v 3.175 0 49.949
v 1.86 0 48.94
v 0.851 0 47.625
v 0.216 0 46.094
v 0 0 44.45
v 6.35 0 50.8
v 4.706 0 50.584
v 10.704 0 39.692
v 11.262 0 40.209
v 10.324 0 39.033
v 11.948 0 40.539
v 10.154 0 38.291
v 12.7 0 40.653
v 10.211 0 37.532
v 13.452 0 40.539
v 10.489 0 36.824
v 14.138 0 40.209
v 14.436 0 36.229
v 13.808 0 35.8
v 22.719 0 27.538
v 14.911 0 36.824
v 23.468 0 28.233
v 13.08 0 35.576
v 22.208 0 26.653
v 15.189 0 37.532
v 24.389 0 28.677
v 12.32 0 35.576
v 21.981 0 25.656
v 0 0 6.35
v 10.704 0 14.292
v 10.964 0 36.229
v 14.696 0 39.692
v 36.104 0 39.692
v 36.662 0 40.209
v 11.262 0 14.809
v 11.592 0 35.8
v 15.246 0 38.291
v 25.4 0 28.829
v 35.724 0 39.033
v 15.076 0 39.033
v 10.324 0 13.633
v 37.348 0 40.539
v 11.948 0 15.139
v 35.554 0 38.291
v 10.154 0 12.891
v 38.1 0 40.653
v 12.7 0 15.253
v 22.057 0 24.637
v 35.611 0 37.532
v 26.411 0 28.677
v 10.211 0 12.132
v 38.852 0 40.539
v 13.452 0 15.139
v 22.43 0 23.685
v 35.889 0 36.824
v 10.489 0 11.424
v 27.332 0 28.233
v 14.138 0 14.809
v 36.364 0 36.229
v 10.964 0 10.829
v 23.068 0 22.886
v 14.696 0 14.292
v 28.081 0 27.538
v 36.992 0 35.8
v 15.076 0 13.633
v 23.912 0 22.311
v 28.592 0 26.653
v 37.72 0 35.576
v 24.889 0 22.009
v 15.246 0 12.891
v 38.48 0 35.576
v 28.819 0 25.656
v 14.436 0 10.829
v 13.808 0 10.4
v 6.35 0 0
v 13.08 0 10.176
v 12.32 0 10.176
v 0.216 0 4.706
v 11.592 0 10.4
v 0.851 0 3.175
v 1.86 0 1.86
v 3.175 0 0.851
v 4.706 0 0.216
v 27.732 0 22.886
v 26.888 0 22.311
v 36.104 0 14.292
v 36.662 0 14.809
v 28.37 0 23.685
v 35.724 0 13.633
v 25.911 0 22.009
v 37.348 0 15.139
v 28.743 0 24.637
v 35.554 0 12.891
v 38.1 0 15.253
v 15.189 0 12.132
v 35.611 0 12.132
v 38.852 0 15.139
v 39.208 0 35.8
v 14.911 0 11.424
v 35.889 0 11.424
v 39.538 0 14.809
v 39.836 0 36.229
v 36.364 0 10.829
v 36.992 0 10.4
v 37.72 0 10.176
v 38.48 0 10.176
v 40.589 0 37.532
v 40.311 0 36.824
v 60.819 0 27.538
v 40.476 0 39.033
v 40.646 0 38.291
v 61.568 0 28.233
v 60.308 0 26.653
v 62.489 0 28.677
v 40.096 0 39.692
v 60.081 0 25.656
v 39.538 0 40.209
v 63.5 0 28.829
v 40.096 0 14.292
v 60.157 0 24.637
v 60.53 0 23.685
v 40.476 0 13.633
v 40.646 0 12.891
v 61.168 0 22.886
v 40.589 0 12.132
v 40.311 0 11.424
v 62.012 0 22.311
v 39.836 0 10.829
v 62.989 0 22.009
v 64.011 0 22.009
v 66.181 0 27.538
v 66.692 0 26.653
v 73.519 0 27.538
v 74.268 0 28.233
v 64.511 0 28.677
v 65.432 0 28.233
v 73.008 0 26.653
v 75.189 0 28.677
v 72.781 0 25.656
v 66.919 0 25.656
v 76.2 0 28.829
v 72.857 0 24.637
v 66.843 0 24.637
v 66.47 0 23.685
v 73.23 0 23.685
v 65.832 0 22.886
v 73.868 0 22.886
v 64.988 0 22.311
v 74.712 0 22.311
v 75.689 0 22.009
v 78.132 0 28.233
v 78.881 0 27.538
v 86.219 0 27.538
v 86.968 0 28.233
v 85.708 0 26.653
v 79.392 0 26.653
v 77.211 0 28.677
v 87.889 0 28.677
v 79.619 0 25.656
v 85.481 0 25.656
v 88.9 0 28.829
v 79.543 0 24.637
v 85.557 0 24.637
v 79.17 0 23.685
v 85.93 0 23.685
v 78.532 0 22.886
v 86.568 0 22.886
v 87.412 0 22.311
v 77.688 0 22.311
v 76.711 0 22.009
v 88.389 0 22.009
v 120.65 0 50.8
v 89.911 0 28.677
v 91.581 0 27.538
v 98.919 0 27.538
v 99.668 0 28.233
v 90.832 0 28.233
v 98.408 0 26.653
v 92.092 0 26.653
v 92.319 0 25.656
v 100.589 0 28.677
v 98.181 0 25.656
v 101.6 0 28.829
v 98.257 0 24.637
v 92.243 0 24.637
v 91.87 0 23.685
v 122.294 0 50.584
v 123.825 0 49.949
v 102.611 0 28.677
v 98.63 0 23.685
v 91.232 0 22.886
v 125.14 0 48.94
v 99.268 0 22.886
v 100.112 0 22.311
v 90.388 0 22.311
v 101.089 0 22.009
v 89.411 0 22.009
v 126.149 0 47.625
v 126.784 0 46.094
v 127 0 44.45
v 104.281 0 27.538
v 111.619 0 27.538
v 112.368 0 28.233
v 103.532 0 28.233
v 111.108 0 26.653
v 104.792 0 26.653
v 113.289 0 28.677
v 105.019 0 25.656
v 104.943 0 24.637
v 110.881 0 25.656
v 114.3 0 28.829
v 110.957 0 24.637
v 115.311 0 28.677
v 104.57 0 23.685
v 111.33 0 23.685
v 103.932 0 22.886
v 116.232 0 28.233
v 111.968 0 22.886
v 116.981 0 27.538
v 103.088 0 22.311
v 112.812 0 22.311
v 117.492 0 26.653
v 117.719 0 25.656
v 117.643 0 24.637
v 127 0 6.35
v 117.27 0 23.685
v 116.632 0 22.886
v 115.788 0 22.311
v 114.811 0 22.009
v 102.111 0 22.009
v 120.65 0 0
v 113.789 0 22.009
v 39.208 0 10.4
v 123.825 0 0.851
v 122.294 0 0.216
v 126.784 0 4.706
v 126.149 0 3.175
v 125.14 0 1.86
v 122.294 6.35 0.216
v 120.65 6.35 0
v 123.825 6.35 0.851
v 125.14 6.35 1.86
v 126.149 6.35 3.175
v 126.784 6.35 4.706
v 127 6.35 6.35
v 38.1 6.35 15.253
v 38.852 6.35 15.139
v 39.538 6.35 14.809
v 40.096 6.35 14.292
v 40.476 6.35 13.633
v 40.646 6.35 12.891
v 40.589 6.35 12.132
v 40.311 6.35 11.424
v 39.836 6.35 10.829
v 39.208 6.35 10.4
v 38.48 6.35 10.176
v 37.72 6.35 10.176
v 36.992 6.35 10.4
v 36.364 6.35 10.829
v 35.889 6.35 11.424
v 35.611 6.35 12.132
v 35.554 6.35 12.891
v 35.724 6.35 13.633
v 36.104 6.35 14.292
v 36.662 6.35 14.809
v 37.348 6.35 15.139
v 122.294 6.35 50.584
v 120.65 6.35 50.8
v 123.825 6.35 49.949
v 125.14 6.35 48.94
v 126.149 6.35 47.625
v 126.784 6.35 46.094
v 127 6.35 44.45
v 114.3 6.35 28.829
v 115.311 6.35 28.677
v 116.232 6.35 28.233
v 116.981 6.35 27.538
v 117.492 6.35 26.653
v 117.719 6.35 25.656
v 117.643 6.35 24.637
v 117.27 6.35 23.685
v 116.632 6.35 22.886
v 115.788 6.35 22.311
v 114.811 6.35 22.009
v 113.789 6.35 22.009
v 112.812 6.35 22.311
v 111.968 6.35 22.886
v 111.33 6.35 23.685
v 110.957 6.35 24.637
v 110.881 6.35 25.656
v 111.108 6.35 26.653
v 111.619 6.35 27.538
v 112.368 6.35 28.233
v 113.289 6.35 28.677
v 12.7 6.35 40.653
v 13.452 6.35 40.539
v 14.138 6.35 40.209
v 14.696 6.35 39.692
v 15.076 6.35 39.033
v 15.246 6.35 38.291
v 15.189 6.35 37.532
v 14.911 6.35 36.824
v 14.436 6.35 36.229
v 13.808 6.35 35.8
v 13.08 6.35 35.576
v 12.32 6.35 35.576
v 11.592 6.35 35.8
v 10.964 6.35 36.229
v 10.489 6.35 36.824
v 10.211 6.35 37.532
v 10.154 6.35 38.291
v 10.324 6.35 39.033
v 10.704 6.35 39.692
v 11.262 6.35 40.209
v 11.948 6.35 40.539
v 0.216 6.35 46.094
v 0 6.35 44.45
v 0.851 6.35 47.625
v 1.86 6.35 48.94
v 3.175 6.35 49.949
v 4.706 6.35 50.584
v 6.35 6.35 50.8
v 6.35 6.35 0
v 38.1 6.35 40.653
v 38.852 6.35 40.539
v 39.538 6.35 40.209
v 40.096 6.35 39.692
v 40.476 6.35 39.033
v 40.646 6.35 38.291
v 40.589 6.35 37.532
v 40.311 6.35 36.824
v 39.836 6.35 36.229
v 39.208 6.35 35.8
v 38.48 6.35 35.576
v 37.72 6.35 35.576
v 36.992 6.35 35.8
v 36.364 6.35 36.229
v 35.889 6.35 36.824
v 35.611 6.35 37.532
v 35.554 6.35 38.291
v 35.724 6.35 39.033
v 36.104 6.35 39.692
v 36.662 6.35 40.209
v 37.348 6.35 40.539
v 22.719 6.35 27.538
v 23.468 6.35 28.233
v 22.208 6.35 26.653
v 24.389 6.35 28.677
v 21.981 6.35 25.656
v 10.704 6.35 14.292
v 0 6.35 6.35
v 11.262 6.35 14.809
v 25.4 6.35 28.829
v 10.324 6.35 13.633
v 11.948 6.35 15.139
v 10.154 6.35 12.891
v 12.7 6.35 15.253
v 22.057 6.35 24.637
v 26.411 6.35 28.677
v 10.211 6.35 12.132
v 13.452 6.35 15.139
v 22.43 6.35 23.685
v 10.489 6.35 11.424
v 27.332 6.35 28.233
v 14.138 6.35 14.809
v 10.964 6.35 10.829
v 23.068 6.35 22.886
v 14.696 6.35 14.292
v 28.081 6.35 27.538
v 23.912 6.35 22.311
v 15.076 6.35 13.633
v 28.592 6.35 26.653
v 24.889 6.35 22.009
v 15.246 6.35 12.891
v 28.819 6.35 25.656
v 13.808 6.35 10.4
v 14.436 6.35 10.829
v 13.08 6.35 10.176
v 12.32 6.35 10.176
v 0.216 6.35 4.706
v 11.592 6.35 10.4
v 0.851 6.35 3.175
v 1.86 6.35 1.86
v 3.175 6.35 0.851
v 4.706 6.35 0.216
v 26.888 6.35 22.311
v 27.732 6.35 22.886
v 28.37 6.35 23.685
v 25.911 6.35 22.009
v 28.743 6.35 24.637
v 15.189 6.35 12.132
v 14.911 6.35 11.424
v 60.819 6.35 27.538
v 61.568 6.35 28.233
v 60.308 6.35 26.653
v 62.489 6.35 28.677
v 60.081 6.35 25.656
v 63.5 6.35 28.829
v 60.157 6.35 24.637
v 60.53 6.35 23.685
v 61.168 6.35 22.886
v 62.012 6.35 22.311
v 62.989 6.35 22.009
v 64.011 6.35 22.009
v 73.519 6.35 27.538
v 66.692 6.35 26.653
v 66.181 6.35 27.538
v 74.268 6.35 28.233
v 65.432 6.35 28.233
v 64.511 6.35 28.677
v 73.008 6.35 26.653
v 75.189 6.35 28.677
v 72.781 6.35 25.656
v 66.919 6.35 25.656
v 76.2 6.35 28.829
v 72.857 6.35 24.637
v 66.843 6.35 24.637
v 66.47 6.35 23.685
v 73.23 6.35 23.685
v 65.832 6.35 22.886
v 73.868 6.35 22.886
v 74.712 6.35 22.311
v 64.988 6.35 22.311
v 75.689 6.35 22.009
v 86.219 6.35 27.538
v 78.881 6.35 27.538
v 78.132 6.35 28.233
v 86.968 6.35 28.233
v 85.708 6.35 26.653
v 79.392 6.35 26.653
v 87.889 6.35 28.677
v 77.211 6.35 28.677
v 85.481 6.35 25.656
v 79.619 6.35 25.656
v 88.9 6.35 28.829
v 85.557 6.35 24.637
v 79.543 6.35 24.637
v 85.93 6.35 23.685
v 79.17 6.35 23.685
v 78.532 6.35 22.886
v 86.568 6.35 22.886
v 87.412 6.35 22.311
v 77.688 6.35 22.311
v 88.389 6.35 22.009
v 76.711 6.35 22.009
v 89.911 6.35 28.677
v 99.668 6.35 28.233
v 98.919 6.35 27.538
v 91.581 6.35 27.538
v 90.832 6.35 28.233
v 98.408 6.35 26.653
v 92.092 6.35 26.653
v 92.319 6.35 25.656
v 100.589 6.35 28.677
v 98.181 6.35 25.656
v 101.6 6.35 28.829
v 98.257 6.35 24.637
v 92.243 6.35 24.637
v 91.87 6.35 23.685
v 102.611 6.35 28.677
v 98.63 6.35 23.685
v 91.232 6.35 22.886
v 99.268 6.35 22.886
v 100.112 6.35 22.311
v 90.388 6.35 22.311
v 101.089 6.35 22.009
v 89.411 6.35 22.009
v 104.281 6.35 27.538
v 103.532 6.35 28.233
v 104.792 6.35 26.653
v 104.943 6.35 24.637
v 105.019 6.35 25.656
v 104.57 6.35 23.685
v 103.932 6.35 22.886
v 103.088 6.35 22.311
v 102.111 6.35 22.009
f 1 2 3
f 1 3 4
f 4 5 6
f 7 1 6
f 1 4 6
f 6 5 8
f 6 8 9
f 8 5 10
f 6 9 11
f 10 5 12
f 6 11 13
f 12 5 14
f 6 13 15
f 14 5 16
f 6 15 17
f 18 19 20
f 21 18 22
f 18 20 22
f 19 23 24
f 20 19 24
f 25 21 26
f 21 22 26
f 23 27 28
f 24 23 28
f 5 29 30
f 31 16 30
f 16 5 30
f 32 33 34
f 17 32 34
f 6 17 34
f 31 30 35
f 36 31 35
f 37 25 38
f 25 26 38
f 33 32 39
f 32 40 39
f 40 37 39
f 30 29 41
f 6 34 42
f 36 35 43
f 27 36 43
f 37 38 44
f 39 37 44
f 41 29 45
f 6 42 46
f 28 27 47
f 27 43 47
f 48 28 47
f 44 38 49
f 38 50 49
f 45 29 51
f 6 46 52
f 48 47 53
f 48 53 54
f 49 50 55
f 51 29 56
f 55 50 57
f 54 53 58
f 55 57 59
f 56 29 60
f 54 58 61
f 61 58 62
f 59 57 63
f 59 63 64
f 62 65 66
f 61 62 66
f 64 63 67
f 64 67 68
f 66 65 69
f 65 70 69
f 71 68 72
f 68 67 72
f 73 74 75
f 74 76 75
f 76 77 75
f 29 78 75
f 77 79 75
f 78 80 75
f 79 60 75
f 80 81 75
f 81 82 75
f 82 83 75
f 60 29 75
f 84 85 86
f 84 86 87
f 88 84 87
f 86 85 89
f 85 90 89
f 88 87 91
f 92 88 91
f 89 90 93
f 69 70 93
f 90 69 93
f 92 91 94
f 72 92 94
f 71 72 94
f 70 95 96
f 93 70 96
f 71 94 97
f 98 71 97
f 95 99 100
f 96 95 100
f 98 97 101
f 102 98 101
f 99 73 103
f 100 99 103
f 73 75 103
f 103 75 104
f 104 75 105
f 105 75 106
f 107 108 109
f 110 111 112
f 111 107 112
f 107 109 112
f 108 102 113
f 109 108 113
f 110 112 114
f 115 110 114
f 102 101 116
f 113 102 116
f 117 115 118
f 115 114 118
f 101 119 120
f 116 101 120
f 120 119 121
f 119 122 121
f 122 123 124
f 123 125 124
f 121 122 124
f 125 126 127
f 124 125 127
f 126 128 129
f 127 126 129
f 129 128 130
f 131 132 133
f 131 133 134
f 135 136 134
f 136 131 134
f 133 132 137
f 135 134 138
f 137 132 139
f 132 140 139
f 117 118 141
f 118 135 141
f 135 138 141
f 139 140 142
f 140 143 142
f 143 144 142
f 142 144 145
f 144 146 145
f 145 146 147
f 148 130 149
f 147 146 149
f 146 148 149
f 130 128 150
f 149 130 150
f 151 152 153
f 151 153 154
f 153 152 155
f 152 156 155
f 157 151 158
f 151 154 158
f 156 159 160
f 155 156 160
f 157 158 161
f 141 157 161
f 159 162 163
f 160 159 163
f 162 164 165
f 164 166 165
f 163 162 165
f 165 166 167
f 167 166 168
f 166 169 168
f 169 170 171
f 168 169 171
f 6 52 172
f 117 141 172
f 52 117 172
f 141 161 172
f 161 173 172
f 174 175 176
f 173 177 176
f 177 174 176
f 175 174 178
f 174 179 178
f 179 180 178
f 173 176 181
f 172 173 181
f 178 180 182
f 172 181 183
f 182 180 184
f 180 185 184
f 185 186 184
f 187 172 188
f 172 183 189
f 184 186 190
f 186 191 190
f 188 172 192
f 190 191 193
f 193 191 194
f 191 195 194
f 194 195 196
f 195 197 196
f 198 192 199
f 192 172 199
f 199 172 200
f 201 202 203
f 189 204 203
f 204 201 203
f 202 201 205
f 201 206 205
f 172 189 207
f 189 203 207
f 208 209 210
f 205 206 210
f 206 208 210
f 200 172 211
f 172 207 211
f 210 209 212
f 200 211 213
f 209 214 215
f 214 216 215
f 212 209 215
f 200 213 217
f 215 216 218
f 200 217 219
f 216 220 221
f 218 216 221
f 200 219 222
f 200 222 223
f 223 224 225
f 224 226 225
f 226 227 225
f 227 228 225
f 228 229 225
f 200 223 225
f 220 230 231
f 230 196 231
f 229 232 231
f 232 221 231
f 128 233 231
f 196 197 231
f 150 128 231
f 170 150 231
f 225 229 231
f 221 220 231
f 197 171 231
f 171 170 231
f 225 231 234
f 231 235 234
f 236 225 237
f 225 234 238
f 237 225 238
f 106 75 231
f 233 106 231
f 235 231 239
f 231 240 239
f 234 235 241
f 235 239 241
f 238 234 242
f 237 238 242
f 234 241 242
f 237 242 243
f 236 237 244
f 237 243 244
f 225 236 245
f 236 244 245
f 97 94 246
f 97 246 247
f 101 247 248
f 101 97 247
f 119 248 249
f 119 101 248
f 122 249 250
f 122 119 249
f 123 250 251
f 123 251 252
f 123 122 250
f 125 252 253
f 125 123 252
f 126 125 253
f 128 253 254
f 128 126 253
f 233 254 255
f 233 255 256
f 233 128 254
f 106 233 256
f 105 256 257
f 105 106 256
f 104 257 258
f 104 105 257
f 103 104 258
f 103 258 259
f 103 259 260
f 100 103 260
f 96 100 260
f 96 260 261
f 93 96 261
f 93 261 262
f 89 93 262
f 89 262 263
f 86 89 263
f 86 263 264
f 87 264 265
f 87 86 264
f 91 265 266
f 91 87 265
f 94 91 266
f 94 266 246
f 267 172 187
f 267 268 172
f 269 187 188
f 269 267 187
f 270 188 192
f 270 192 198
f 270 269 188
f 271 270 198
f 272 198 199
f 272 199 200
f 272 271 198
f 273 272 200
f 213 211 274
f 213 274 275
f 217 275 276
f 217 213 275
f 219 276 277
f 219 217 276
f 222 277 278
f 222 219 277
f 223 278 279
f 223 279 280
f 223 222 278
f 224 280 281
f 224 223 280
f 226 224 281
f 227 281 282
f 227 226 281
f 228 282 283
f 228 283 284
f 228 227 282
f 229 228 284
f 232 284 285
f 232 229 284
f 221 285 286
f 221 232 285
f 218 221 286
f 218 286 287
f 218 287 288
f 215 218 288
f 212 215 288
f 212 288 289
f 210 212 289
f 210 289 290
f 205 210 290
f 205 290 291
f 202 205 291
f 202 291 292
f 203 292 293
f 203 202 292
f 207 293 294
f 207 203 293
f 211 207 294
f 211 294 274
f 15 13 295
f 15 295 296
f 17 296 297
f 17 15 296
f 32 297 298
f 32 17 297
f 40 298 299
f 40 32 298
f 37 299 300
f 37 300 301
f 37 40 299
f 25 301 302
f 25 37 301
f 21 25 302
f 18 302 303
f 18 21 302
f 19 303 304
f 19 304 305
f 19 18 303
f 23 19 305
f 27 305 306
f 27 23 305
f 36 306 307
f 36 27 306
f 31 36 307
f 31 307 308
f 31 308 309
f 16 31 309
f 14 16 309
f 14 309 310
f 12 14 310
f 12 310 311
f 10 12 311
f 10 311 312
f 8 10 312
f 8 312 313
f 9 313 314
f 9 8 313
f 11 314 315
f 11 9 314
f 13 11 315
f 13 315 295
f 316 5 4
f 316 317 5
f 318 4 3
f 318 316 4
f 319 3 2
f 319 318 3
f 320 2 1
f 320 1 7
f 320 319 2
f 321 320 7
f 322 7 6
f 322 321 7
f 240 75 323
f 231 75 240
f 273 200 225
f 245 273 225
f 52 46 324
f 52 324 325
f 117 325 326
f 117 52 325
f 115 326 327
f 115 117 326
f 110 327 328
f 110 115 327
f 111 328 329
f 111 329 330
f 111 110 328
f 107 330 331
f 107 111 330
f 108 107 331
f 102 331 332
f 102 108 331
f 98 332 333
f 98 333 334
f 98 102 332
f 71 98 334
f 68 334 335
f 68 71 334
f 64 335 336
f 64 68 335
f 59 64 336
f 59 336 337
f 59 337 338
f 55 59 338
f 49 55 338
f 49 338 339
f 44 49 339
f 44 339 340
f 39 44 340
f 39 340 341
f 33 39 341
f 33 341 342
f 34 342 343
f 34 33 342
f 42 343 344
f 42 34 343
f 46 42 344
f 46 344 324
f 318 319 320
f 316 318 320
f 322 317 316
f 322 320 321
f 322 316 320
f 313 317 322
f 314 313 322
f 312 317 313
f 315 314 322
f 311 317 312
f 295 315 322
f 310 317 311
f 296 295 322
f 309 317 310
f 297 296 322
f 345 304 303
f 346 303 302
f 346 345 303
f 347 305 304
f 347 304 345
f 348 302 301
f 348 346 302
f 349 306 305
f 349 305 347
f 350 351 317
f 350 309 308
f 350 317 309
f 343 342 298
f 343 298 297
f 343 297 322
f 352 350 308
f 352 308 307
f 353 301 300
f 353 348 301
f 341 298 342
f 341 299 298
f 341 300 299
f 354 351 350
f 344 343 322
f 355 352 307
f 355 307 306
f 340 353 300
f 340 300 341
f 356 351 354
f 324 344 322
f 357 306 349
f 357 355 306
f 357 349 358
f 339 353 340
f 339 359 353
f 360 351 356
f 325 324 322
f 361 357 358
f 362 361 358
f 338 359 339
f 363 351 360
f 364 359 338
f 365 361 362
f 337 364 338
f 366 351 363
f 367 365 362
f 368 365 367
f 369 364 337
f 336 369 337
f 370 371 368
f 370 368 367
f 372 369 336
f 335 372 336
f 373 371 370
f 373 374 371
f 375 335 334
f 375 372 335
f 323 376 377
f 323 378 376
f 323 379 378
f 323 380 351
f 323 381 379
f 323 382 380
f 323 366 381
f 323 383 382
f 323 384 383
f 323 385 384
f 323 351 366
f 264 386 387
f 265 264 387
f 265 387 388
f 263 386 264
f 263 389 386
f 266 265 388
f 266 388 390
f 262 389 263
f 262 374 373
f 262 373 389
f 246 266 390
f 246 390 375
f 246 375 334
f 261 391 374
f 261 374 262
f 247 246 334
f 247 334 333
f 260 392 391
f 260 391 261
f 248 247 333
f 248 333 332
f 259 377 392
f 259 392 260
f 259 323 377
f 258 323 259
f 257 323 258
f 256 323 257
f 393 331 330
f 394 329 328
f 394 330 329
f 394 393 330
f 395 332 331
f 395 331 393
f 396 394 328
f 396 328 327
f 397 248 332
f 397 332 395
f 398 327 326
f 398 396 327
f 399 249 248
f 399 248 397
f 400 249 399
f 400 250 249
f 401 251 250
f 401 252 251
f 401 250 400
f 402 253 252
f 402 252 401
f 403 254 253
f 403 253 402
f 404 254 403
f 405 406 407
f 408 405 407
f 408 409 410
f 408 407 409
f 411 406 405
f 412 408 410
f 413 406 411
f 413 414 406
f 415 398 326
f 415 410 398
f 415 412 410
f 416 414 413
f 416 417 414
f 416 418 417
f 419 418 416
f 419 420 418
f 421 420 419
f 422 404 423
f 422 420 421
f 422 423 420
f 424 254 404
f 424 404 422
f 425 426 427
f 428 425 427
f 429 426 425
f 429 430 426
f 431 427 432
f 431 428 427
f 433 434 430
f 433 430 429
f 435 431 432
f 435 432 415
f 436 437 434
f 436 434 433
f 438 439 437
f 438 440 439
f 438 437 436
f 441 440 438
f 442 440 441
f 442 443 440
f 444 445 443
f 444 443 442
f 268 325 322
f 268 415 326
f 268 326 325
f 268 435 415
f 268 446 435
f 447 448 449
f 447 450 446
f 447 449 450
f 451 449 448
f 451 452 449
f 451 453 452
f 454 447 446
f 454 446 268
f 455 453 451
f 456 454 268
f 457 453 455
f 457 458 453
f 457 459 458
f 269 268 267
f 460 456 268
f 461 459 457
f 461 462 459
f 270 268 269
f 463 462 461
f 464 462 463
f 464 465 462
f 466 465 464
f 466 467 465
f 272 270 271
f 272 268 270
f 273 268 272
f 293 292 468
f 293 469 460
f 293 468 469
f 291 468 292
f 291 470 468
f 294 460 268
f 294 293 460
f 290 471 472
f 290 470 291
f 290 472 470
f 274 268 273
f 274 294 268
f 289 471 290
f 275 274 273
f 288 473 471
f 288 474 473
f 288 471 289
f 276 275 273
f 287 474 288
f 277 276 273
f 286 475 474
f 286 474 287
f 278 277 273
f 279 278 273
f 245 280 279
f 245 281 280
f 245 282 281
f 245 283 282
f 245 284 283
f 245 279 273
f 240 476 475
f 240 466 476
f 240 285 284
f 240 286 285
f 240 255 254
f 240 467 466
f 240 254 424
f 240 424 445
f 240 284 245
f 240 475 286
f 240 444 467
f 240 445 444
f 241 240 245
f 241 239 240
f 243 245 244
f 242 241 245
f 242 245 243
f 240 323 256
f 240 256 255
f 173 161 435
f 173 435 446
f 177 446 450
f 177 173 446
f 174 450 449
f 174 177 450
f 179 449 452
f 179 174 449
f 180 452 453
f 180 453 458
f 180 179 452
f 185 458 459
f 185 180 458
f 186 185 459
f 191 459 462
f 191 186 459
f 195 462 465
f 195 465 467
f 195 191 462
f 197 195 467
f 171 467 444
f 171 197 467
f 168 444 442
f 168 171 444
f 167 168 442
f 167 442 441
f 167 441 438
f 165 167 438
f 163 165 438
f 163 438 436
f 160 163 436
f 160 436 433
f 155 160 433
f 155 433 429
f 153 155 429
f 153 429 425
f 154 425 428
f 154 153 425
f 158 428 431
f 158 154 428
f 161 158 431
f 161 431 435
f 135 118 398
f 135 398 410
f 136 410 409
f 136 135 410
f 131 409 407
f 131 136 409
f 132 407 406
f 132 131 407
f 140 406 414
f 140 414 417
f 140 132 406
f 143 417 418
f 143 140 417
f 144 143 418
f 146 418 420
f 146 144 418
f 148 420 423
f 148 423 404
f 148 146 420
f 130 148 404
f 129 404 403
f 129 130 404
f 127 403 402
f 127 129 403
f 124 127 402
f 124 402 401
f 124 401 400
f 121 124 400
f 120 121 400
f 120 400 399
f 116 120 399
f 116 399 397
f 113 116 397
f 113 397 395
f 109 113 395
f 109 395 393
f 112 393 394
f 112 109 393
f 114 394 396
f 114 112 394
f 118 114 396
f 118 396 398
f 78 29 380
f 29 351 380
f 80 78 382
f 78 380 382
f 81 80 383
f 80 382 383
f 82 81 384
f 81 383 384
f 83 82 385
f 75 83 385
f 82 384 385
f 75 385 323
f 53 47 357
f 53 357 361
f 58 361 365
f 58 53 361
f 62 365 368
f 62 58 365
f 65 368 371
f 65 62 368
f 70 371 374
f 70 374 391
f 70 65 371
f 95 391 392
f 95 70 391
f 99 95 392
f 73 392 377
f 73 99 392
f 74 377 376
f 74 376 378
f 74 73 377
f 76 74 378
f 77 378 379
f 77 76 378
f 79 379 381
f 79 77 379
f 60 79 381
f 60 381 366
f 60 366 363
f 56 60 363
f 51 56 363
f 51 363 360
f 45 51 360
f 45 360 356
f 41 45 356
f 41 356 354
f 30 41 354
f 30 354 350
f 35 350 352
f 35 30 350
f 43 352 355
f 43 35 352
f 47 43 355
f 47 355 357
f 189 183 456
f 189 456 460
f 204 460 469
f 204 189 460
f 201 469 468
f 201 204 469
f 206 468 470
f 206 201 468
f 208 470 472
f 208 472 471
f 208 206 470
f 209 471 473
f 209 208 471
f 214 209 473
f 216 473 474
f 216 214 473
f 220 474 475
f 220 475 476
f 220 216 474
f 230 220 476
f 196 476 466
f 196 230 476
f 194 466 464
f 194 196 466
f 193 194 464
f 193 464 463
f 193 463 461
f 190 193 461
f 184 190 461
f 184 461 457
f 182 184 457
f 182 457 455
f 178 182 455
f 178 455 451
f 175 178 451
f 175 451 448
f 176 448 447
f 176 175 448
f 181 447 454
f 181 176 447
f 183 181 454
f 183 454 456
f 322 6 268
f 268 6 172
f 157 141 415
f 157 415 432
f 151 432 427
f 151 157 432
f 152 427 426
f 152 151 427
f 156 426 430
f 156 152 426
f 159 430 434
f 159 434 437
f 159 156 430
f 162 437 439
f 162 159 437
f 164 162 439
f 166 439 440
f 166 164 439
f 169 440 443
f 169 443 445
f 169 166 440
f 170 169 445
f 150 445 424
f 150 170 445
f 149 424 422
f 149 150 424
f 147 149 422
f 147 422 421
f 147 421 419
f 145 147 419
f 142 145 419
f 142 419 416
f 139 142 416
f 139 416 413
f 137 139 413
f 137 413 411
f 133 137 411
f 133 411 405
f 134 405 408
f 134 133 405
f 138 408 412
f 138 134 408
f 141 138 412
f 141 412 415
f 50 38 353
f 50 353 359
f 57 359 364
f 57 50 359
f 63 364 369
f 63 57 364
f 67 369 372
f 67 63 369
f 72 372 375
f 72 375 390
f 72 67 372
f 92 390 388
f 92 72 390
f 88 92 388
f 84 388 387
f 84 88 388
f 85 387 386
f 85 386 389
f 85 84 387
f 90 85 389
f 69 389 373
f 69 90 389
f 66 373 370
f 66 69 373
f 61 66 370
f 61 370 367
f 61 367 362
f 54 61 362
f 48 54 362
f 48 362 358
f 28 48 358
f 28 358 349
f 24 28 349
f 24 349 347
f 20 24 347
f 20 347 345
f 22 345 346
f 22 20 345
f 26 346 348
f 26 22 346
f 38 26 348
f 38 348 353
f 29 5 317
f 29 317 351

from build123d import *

# Parameters (mm, degrees)
SKETCH1_W           = 127
SKETCH1_H           = 50.8
SKETCH1_R           = 2.5527
SKETCH1_R_2         = 3.429
BOSS_EXTRUDE1_DEPTH = 6.35
FILLET1_R           = 6.35


with BuildPart() as part:
    # Sketch1 → Boss-Extrude1 (new body)
    with BuildSketch(Plane(origin=(0, 0, 0), x_dir=(1, 0, 0), z_dir=(0, 1, 0))):
        with Locations((63.5, -25.4)):
            Rectangle(SKETCH1_W, SKETCH1_H)
        with Locations(Location((12.7, -12.7, 0), (0, 0, 270))):
            Circle(SKETCH1_R, mode=Mode.SUBTRACT)
        with Locations(Location((38.1, -12.7, 0), (0, 0, 270))):
            Circle(SKETCH1_R, mode=Mode.SUBTRACT)
        with Locations(Location((38.1, -38.1, 0), (0, 0, 270))):
            Circle(SKETCH1_R, mode=Mode.SUBTRACT)
        with Locations(Location((12.7, -38.1, 0), (0, 0, 270))):
            Circle(SKETCH1_R, mode=Mode.SUBTRACT)
        with Locations(Location((25.4, -25.4, 0), (0, 0, 270))):
            Circle(SKETCH1_R_2, mode=Mode.SUBTRACT)
        with Locations(Location((63.5, -25.4, 0), (0, 0, 270))):
            Circle(SKETCH1_R_2, mode=Mode.SUBTRACT)
        with Locations(Location((76.2, -25.4, 0), (0, 0, 270))):
            Circle(SKETCH1_R_2, mode=Mode.SUBTRACT)
        with Locations(Location((88.9, -25.4, 0), (0, 0, 270))):
            Circle(SKETCH1_R_2, mode=Mode.SUBTRACT)
        with Locations(Location((101.6, -25.4, 0), (0, 0, 270))):
            Circle(SKETCH1_R_2, mode=Mode.SUBTRACT)
        with Locations(Location((114.3, -25.4, 0), (0, 0, 270))):
            Circle(SKETCH1_R_2, mode=Mode.SUBTRACT)
    extrude(amount=BOSS_EXTRUDE1_DEPTH)

    # Fillet1
    fillet1_edges = [part.edges().sort_by_distance(p)[0] for p in [
        (0, 3.175, 0),
        (127, 3.175, 0),
        (127, 3.175, 50.8),
        (0, 3.175, 50.8),
    ]]
    fillet(fillet1_edges, radius=FILLET1_R)


solid = part.part
